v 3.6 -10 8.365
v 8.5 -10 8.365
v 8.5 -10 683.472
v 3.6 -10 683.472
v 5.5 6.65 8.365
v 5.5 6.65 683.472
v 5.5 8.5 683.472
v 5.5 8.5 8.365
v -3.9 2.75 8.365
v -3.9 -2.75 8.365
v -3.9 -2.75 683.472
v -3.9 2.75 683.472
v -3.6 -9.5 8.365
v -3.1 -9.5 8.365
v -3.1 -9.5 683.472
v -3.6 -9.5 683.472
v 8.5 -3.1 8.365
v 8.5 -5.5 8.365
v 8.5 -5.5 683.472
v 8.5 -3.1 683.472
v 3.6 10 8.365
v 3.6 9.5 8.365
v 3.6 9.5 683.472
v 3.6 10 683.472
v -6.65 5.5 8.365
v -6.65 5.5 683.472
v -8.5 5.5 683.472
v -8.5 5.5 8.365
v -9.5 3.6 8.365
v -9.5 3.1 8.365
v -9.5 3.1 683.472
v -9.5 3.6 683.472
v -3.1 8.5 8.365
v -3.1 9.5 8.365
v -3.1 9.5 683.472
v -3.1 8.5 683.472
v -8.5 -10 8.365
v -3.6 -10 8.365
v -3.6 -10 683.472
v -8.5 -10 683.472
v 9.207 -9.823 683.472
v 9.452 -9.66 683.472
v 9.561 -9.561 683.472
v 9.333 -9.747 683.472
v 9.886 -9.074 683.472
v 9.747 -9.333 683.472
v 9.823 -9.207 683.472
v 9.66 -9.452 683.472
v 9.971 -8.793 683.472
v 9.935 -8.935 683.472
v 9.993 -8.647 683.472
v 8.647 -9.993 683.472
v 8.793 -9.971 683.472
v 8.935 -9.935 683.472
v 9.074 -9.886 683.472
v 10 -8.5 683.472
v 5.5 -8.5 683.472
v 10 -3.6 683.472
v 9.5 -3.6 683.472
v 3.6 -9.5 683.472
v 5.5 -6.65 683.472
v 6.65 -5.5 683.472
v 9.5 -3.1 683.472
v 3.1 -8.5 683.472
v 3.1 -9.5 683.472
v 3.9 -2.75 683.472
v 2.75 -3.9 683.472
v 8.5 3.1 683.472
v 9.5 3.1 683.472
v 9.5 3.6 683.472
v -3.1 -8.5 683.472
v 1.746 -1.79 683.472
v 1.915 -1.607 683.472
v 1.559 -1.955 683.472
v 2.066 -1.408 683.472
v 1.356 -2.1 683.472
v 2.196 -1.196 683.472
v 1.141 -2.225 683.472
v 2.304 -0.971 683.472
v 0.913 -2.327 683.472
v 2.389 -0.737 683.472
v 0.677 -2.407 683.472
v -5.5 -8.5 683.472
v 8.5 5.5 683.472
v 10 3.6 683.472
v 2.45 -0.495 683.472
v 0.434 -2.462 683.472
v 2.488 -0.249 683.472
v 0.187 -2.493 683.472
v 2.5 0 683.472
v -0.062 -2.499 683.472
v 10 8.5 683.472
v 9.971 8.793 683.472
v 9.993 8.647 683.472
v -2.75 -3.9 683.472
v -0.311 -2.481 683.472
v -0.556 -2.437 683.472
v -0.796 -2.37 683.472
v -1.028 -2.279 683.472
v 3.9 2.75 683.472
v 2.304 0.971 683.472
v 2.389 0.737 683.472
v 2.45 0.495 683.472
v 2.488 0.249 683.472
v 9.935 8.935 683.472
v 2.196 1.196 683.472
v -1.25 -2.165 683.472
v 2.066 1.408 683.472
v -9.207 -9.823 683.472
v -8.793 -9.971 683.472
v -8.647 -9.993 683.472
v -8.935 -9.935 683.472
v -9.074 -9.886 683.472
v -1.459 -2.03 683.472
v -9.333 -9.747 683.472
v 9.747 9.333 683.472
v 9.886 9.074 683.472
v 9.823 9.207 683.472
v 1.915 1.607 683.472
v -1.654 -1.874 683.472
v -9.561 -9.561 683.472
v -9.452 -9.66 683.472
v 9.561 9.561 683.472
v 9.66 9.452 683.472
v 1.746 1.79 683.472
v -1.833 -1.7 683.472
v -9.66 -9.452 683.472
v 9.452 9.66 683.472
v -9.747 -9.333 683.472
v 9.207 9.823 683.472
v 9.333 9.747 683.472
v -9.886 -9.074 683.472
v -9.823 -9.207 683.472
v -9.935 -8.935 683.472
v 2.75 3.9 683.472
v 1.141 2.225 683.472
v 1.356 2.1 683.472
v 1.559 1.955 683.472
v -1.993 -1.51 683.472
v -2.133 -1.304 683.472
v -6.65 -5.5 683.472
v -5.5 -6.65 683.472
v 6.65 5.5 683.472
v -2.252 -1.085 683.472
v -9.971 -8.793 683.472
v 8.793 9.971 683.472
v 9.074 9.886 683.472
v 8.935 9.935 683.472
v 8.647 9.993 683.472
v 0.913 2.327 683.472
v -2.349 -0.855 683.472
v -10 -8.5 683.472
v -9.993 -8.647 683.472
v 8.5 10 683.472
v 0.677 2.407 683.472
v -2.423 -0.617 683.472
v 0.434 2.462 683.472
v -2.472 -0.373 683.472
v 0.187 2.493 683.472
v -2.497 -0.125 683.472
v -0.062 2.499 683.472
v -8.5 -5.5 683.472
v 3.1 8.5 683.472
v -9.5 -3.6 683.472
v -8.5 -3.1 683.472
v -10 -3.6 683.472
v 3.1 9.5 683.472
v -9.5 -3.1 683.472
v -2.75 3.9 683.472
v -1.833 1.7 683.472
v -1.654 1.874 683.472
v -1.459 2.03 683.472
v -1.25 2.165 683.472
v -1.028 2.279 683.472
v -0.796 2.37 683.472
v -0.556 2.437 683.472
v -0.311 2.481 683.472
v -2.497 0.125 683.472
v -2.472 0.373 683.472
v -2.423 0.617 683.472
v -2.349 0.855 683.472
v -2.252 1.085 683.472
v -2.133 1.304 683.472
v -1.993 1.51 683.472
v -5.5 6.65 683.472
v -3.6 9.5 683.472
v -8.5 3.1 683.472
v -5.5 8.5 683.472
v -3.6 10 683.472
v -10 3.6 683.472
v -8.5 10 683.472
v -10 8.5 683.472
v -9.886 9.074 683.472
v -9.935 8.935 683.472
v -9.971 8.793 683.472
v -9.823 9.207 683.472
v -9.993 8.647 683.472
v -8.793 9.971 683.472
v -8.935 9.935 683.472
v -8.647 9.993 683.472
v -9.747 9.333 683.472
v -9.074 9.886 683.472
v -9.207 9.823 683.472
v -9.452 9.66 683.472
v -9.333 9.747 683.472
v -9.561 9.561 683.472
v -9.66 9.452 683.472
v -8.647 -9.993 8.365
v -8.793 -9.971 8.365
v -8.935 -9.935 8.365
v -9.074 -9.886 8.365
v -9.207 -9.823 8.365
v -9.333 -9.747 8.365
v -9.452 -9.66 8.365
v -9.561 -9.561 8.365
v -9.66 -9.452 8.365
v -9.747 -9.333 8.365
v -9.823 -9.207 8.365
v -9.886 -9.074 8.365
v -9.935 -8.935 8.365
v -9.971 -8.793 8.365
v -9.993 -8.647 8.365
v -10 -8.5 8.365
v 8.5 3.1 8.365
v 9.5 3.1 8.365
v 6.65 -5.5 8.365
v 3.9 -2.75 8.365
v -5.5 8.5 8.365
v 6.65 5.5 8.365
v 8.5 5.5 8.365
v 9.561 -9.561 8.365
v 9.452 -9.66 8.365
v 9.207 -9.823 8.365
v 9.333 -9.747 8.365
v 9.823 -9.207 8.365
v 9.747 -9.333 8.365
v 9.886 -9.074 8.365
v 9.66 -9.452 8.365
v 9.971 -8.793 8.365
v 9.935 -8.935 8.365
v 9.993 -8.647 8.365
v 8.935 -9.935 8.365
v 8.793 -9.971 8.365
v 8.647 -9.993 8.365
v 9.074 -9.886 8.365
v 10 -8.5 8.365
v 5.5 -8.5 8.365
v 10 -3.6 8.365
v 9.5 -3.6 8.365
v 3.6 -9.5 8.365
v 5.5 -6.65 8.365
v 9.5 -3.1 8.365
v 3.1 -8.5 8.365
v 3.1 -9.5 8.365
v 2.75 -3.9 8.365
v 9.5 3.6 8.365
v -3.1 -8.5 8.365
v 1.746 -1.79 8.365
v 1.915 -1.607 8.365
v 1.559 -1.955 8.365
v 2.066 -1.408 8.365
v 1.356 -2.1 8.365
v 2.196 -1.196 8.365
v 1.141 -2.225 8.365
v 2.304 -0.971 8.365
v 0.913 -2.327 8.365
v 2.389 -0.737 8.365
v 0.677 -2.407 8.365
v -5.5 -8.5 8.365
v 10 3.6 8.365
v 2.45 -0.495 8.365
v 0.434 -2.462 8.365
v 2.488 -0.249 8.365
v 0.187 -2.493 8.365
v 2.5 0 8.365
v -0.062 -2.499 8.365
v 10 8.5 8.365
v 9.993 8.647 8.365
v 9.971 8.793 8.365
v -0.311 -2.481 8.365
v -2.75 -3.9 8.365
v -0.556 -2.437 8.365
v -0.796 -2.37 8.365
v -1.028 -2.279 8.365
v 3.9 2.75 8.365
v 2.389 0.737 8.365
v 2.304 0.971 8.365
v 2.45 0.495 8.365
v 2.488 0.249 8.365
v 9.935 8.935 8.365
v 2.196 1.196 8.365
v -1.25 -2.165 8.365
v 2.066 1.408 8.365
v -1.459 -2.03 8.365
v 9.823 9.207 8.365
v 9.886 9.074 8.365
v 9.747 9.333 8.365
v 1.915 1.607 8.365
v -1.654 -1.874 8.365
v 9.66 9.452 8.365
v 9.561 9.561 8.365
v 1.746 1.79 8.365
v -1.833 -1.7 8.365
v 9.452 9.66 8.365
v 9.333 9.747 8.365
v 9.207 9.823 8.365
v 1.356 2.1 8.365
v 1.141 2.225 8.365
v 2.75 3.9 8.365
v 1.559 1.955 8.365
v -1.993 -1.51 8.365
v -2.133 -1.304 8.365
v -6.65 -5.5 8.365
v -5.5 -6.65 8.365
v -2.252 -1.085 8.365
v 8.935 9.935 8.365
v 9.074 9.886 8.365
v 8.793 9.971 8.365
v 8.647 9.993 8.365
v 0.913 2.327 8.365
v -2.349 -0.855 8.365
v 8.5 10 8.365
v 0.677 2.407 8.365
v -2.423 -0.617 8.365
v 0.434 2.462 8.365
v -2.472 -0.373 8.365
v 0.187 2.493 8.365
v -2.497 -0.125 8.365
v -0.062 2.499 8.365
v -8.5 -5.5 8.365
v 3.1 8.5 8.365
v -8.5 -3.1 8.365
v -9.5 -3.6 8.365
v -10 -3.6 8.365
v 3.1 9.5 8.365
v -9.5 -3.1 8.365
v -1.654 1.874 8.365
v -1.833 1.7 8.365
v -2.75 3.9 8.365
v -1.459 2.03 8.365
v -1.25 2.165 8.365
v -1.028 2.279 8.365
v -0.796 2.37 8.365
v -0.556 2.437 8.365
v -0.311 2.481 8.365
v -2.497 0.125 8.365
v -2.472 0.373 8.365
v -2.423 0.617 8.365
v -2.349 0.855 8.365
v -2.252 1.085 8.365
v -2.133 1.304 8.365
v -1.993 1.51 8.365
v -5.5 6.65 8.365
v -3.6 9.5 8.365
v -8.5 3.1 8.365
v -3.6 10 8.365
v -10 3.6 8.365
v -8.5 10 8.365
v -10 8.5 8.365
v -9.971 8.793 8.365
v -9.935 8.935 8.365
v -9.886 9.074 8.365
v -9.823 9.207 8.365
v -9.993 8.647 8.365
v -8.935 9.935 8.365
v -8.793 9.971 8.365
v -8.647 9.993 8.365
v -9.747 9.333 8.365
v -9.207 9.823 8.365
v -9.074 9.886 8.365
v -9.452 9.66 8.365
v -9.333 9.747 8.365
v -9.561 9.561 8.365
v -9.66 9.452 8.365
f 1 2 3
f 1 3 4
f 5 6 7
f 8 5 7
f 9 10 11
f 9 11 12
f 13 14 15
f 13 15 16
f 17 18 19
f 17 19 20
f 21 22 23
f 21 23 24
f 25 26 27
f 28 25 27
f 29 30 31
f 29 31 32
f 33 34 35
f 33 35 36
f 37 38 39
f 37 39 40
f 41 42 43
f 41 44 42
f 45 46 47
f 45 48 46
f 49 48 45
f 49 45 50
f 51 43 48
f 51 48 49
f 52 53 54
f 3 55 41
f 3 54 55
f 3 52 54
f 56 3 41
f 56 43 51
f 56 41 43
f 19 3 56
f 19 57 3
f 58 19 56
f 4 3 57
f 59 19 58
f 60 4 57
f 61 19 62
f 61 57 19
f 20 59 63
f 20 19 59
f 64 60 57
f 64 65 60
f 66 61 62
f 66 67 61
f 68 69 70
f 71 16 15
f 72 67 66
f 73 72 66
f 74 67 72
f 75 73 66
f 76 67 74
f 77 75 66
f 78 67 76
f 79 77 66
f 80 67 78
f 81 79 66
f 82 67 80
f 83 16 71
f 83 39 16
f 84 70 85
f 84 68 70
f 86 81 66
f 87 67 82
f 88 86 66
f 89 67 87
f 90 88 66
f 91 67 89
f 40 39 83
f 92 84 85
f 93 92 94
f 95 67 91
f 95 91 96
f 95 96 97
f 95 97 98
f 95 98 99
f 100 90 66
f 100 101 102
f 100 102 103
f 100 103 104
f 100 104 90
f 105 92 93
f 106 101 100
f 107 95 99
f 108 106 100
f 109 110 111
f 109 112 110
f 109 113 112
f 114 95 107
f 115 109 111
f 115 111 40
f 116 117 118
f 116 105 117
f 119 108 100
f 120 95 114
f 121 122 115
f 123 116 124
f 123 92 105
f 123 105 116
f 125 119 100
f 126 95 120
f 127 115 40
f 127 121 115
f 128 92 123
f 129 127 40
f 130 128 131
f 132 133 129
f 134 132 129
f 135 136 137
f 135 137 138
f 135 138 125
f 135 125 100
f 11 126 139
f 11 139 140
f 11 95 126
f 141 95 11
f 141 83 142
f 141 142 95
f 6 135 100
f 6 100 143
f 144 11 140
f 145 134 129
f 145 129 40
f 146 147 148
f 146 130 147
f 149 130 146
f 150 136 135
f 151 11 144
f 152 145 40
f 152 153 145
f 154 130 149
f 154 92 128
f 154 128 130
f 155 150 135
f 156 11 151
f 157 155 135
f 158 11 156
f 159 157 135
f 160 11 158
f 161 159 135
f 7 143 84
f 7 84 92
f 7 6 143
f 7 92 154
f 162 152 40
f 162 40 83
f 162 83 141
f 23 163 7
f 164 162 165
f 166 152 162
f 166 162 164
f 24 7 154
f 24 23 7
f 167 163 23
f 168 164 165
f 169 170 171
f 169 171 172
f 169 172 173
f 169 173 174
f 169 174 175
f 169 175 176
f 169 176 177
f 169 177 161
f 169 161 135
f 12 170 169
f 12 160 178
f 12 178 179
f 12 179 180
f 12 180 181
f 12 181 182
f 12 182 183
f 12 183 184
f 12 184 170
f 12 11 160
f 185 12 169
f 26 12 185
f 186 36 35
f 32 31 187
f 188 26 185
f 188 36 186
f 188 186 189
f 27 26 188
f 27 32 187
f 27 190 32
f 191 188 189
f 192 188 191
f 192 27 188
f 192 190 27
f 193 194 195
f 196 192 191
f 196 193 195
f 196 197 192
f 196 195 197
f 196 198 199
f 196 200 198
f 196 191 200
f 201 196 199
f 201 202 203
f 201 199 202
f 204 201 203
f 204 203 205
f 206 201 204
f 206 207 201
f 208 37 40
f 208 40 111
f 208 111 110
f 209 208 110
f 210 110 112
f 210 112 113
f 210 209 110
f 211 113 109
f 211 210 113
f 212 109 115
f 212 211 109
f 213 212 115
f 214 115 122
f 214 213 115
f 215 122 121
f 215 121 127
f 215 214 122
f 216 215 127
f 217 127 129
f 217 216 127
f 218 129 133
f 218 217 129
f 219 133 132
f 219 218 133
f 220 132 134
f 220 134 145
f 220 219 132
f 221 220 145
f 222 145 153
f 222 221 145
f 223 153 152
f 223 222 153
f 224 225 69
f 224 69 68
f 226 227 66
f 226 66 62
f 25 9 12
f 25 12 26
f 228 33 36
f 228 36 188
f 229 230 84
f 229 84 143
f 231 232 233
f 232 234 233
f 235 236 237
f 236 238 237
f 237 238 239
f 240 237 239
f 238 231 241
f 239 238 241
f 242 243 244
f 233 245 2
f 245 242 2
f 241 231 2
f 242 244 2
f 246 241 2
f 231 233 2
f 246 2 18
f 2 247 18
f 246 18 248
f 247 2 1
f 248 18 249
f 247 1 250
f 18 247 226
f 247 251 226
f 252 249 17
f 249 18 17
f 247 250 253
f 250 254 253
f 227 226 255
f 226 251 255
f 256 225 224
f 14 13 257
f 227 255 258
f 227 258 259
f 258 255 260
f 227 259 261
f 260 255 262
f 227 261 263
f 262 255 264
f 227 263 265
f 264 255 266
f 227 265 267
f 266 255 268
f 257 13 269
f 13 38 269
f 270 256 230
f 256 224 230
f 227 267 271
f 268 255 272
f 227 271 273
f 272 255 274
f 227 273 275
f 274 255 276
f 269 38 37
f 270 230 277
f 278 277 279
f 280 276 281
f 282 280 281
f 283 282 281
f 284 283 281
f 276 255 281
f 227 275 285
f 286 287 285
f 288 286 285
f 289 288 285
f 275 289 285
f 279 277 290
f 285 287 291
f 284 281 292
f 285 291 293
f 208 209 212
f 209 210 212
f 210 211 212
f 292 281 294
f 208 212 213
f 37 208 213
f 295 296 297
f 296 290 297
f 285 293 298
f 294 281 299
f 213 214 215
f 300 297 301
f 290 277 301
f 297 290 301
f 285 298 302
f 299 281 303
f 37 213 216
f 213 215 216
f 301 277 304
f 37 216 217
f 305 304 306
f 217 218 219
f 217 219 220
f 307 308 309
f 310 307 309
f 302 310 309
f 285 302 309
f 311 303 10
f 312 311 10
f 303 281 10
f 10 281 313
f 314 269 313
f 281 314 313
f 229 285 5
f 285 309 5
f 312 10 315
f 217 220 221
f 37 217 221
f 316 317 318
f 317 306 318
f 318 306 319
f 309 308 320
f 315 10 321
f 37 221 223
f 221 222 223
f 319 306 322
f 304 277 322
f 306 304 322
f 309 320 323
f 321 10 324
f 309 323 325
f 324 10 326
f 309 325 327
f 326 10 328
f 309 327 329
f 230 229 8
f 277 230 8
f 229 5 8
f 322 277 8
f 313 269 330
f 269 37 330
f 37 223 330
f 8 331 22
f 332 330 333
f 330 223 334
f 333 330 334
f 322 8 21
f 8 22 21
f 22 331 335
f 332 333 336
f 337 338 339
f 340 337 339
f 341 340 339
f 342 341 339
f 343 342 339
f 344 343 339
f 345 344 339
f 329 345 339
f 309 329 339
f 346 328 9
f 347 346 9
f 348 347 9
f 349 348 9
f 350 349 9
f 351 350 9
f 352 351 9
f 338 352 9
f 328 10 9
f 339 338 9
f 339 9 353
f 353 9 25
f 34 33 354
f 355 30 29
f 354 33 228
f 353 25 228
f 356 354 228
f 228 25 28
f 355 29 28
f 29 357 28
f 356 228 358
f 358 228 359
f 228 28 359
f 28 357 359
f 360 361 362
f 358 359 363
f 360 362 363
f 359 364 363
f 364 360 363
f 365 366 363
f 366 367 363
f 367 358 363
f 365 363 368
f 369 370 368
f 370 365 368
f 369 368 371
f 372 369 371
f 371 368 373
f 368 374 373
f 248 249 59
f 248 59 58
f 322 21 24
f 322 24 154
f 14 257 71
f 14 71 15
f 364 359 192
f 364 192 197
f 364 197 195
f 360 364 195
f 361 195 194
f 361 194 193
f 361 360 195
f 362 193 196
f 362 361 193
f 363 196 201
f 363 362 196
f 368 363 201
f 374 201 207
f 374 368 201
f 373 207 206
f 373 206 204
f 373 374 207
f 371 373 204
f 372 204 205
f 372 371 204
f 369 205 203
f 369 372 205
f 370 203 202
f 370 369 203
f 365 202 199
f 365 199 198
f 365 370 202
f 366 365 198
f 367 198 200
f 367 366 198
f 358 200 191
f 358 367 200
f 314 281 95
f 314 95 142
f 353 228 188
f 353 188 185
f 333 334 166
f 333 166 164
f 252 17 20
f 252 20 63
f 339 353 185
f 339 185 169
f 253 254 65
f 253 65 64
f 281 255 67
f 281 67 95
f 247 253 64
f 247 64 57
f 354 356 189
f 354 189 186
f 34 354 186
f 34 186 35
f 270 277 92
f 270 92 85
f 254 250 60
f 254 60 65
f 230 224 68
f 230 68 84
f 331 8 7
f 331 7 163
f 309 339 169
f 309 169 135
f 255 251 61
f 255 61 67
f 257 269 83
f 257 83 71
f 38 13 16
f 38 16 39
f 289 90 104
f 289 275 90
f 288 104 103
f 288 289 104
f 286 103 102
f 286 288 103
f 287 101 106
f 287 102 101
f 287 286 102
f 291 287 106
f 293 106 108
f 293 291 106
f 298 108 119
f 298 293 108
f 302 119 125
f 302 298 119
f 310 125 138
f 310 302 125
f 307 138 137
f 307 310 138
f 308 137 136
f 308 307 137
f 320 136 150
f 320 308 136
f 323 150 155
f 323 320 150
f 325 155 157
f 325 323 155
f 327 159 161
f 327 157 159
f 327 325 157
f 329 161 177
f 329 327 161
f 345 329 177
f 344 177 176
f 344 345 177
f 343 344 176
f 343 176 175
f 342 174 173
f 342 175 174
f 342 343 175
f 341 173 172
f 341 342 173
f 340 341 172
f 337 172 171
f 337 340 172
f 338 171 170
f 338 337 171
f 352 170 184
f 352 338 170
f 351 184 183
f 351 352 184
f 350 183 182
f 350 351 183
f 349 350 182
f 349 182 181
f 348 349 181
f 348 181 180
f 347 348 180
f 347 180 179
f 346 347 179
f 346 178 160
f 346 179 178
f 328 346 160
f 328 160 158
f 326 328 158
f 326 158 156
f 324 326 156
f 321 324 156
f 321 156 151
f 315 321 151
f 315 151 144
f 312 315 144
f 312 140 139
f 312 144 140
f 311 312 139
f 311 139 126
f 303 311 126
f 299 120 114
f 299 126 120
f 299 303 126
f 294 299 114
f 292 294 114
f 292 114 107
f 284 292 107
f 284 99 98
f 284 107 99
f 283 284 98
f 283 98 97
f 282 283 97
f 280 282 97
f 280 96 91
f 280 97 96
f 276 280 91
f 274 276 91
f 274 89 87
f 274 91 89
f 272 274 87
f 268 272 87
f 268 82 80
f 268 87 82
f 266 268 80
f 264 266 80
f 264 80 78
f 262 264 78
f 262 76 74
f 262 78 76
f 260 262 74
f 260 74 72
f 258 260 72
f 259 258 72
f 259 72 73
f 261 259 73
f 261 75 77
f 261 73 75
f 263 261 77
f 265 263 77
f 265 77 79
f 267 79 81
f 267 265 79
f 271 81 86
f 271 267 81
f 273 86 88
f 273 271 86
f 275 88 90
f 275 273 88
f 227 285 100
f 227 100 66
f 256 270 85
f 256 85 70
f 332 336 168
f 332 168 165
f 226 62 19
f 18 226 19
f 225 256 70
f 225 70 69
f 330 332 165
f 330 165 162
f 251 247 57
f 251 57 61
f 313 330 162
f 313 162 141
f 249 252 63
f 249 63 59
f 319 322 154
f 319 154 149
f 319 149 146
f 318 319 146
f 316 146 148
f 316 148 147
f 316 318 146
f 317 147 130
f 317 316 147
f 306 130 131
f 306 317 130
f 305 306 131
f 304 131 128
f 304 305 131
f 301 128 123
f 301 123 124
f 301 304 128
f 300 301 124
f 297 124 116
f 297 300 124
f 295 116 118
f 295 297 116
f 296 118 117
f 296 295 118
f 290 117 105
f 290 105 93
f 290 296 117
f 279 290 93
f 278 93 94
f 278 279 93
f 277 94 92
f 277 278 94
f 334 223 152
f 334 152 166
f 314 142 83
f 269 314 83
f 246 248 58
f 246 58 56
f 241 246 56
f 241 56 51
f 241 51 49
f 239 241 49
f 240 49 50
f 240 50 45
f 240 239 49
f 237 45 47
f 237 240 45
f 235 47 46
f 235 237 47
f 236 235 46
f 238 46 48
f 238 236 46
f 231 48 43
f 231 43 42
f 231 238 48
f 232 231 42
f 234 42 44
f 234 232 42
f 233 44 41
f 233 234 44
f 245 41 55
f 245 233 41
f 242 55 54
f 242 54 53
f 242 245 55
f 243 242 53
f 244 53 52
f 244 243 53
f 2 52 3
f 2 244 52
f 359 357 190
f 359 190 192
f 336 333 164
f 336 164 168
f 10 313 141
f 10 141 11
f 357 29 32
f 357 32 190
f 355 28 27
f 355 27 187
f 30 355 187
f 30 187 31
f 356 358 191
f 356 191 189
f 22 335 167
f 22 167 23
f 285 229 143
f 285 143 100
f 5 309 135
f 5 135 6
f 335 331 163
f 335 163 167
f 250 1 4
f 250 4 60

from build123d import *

# Parameters (mm, degrees)
SKETCH_1_R          = 2.5
EXTRUDE_1_DEPTH     = 700
SKETCH_2_W          = 16.527744628
SKETCH_2_H          = 22.497789949
CUT_EXTRUDE_1_DEPTH = 21
SKETCH_3_W          = 8.365047253
SKETCH_3_H          = 23
CUT_EXTRUDE_2_DEPTH = 21


with BuildPart() as part:
    # 草图1 → 凸台-拉伸1 (new body)
    with BuildSketch(Plane.XY):
        with BuildLine():
            Line((-3.6, 10), (-3.6, 9.5))
            Line((-3.6, 9.5), (-3.1, 9.5))
            Line((-3.1, 9.5), (-3.1, 8.5))
            Line((-3.1, 8.5), (-5.5, 8.5))
            Line((-5.5, 8.5), (-5.5, 6.65))
            Line((-5.5, 6.65), (-2.75, 3.9))
            Line((-2.75, 3.9), (2.75, 3.9))
            Line((2.75, 3.9), (5.5, 6.65))
            Line((5.5, 6.65), (5.5, 8.5))
            Line((5.5, 8.5), (3.1, 8.5))
            Line((3.1, 8.5), (3.1, 9.5))
            Line((3.1, 9.5), (3.6, 9.5))
            Line((3.6, 9.5), (3.6, 10))
            Line((3.6, 10), (8.5, 10))
            ThreePointArc((8.5, 10), (9.560660172, 9.560660172), (10, 8.5))
            Line((10, 8.5), (10, 3.6))
            Line((10, 3.6), (9.5, 3.6))
            Line((9.5, 3.6), (9.5, 3.1))
            Line((9.5, 3.1), (8.5, 3.1))
            Line((8.5, 3.1), (8.5, 5.5))
            Line((8.5, 5.5), (6.65, 5.5))
            Line((6.65, 5.5), (3.9, 2.75))
            Line((3.9, 2.75), (3.9, -2.75))
            Line((3.9, -2.75), (6.65, -5.5))
            Line((6.65, -5.5), (8.5, -5.5))
            Line((8.5, -5.5), (8.5, -3.1))
            Line((8.5, -3.1), (9.5, -3.1))
            Line((9.5, -3.1), (9.5, -3.6))
            Line((9.5, -3.6), (10, -3.6))
            Line((10, -3.6), (10, -8.5))
            ThreePointArc((10, -8.5), (9.560660172, -9.560660172), (8.5, -10))
            Line((8.5, -10), (3.6, -10))
            Line((3.6, -10), (3.6, -9.5))
            Line((3.6, -9.5), (3.1, -9.5))
            Line((3.1, -9.5), (3.1, -8.5))
            Line((3.1, -8.5), (5.5, -8.5))
            Line((5.5, -8.5), (5.5, -6.65))
            Line((5.5, -6.65), (2.75, -3.9))
            Line((2.75, -3.9), (-2.75, -3.9))
            Line((-2.75, -3.9), (-5.5, -6.65))
            Line((-5.5, -6.65), (-5.5, -8.5))
            Line((-5.5, -8.5), (-3.1, -8.5))
            Line((-3.1, -8.5), (-3.1, -9.5))
            Line((-3.1, -9.5), (-3.6, -9.5))
            Line((-3.6, -9.5), (-3.6, -10))
            Line((-3.6, -10), (-8.5, -10))
            ThreePointArc((-8.5, -10), (-9.560660172, -9.560660172), (-10, -8.5))
            Line((-10, -8.5), (-10, -3.6))
            Line((-10, -3.6), (-9.5, -3.6))
            Line((-9.5, -3.6), (-9.5, -3.1))
            Line((-9.5, -3.1), (-8.5, -3.1))
            Line((-8.5, -3.1), (-8.5, -5.5))
            Line((-8.5, -5.5), (-6.65, -5.5))
            Line((-6.65, -5.5), (-3.9, -2.75))
            Line((-3.9, -2.75), (-3.9, 2.75))
            Line((-3.9, 2.75), (-6.65, 5.5))
            Line((-6.65, 5.5), (-8.5, 5.5))
            Line((-8.5, 5.5), (-8.5, 3.1))
            Line((-8.5, 3.1), (-9.5, 3.1))
            Line((-9.5, 3.1), (-9.5, 3.6))
            Line((-9.5, 3.6), (-10, 3.6))
            Line((-10, 3.6), (-10, 8.5))
            ThreePointArc((-10, 8.5), (-9.560660172, 9.560660172), (-8.5, 10))
            Line((-8.5, 10), (-3.6, 10))
        make_face()
        Circle(SKETCH_1_R, mode=Mode.SUBTRACT)
    extrude(amount=EXTRUDE_1_DEPTH)

    # 草图2 → 切除-拉伸1 (cut, through all)
    with BuildSketch(Plane.ZY.offset(10)):
        with Locations((691.736127686, -0.569757727)):
            Rectangle(SKETCH_2_W, SKETCH_2_H)
    extrude(amount=-CUT_EXTRUDE_1_DEPTH, mode=Mode.SUBTRACT)

    # 草图3 → 切除-拉伸2 (cut, through all)
    with BuildSketch(Plane.ZY.offset(10)):
        with Locations((4.182523627, 0.497203085)):
            Rectangle(SKETCH_3_W, SKETCH_3_H)
    extrude(amount=-CUT_EXTRUDE_2_DEPTH, mode=Mode.SUBTRACT)


solid = part.part
